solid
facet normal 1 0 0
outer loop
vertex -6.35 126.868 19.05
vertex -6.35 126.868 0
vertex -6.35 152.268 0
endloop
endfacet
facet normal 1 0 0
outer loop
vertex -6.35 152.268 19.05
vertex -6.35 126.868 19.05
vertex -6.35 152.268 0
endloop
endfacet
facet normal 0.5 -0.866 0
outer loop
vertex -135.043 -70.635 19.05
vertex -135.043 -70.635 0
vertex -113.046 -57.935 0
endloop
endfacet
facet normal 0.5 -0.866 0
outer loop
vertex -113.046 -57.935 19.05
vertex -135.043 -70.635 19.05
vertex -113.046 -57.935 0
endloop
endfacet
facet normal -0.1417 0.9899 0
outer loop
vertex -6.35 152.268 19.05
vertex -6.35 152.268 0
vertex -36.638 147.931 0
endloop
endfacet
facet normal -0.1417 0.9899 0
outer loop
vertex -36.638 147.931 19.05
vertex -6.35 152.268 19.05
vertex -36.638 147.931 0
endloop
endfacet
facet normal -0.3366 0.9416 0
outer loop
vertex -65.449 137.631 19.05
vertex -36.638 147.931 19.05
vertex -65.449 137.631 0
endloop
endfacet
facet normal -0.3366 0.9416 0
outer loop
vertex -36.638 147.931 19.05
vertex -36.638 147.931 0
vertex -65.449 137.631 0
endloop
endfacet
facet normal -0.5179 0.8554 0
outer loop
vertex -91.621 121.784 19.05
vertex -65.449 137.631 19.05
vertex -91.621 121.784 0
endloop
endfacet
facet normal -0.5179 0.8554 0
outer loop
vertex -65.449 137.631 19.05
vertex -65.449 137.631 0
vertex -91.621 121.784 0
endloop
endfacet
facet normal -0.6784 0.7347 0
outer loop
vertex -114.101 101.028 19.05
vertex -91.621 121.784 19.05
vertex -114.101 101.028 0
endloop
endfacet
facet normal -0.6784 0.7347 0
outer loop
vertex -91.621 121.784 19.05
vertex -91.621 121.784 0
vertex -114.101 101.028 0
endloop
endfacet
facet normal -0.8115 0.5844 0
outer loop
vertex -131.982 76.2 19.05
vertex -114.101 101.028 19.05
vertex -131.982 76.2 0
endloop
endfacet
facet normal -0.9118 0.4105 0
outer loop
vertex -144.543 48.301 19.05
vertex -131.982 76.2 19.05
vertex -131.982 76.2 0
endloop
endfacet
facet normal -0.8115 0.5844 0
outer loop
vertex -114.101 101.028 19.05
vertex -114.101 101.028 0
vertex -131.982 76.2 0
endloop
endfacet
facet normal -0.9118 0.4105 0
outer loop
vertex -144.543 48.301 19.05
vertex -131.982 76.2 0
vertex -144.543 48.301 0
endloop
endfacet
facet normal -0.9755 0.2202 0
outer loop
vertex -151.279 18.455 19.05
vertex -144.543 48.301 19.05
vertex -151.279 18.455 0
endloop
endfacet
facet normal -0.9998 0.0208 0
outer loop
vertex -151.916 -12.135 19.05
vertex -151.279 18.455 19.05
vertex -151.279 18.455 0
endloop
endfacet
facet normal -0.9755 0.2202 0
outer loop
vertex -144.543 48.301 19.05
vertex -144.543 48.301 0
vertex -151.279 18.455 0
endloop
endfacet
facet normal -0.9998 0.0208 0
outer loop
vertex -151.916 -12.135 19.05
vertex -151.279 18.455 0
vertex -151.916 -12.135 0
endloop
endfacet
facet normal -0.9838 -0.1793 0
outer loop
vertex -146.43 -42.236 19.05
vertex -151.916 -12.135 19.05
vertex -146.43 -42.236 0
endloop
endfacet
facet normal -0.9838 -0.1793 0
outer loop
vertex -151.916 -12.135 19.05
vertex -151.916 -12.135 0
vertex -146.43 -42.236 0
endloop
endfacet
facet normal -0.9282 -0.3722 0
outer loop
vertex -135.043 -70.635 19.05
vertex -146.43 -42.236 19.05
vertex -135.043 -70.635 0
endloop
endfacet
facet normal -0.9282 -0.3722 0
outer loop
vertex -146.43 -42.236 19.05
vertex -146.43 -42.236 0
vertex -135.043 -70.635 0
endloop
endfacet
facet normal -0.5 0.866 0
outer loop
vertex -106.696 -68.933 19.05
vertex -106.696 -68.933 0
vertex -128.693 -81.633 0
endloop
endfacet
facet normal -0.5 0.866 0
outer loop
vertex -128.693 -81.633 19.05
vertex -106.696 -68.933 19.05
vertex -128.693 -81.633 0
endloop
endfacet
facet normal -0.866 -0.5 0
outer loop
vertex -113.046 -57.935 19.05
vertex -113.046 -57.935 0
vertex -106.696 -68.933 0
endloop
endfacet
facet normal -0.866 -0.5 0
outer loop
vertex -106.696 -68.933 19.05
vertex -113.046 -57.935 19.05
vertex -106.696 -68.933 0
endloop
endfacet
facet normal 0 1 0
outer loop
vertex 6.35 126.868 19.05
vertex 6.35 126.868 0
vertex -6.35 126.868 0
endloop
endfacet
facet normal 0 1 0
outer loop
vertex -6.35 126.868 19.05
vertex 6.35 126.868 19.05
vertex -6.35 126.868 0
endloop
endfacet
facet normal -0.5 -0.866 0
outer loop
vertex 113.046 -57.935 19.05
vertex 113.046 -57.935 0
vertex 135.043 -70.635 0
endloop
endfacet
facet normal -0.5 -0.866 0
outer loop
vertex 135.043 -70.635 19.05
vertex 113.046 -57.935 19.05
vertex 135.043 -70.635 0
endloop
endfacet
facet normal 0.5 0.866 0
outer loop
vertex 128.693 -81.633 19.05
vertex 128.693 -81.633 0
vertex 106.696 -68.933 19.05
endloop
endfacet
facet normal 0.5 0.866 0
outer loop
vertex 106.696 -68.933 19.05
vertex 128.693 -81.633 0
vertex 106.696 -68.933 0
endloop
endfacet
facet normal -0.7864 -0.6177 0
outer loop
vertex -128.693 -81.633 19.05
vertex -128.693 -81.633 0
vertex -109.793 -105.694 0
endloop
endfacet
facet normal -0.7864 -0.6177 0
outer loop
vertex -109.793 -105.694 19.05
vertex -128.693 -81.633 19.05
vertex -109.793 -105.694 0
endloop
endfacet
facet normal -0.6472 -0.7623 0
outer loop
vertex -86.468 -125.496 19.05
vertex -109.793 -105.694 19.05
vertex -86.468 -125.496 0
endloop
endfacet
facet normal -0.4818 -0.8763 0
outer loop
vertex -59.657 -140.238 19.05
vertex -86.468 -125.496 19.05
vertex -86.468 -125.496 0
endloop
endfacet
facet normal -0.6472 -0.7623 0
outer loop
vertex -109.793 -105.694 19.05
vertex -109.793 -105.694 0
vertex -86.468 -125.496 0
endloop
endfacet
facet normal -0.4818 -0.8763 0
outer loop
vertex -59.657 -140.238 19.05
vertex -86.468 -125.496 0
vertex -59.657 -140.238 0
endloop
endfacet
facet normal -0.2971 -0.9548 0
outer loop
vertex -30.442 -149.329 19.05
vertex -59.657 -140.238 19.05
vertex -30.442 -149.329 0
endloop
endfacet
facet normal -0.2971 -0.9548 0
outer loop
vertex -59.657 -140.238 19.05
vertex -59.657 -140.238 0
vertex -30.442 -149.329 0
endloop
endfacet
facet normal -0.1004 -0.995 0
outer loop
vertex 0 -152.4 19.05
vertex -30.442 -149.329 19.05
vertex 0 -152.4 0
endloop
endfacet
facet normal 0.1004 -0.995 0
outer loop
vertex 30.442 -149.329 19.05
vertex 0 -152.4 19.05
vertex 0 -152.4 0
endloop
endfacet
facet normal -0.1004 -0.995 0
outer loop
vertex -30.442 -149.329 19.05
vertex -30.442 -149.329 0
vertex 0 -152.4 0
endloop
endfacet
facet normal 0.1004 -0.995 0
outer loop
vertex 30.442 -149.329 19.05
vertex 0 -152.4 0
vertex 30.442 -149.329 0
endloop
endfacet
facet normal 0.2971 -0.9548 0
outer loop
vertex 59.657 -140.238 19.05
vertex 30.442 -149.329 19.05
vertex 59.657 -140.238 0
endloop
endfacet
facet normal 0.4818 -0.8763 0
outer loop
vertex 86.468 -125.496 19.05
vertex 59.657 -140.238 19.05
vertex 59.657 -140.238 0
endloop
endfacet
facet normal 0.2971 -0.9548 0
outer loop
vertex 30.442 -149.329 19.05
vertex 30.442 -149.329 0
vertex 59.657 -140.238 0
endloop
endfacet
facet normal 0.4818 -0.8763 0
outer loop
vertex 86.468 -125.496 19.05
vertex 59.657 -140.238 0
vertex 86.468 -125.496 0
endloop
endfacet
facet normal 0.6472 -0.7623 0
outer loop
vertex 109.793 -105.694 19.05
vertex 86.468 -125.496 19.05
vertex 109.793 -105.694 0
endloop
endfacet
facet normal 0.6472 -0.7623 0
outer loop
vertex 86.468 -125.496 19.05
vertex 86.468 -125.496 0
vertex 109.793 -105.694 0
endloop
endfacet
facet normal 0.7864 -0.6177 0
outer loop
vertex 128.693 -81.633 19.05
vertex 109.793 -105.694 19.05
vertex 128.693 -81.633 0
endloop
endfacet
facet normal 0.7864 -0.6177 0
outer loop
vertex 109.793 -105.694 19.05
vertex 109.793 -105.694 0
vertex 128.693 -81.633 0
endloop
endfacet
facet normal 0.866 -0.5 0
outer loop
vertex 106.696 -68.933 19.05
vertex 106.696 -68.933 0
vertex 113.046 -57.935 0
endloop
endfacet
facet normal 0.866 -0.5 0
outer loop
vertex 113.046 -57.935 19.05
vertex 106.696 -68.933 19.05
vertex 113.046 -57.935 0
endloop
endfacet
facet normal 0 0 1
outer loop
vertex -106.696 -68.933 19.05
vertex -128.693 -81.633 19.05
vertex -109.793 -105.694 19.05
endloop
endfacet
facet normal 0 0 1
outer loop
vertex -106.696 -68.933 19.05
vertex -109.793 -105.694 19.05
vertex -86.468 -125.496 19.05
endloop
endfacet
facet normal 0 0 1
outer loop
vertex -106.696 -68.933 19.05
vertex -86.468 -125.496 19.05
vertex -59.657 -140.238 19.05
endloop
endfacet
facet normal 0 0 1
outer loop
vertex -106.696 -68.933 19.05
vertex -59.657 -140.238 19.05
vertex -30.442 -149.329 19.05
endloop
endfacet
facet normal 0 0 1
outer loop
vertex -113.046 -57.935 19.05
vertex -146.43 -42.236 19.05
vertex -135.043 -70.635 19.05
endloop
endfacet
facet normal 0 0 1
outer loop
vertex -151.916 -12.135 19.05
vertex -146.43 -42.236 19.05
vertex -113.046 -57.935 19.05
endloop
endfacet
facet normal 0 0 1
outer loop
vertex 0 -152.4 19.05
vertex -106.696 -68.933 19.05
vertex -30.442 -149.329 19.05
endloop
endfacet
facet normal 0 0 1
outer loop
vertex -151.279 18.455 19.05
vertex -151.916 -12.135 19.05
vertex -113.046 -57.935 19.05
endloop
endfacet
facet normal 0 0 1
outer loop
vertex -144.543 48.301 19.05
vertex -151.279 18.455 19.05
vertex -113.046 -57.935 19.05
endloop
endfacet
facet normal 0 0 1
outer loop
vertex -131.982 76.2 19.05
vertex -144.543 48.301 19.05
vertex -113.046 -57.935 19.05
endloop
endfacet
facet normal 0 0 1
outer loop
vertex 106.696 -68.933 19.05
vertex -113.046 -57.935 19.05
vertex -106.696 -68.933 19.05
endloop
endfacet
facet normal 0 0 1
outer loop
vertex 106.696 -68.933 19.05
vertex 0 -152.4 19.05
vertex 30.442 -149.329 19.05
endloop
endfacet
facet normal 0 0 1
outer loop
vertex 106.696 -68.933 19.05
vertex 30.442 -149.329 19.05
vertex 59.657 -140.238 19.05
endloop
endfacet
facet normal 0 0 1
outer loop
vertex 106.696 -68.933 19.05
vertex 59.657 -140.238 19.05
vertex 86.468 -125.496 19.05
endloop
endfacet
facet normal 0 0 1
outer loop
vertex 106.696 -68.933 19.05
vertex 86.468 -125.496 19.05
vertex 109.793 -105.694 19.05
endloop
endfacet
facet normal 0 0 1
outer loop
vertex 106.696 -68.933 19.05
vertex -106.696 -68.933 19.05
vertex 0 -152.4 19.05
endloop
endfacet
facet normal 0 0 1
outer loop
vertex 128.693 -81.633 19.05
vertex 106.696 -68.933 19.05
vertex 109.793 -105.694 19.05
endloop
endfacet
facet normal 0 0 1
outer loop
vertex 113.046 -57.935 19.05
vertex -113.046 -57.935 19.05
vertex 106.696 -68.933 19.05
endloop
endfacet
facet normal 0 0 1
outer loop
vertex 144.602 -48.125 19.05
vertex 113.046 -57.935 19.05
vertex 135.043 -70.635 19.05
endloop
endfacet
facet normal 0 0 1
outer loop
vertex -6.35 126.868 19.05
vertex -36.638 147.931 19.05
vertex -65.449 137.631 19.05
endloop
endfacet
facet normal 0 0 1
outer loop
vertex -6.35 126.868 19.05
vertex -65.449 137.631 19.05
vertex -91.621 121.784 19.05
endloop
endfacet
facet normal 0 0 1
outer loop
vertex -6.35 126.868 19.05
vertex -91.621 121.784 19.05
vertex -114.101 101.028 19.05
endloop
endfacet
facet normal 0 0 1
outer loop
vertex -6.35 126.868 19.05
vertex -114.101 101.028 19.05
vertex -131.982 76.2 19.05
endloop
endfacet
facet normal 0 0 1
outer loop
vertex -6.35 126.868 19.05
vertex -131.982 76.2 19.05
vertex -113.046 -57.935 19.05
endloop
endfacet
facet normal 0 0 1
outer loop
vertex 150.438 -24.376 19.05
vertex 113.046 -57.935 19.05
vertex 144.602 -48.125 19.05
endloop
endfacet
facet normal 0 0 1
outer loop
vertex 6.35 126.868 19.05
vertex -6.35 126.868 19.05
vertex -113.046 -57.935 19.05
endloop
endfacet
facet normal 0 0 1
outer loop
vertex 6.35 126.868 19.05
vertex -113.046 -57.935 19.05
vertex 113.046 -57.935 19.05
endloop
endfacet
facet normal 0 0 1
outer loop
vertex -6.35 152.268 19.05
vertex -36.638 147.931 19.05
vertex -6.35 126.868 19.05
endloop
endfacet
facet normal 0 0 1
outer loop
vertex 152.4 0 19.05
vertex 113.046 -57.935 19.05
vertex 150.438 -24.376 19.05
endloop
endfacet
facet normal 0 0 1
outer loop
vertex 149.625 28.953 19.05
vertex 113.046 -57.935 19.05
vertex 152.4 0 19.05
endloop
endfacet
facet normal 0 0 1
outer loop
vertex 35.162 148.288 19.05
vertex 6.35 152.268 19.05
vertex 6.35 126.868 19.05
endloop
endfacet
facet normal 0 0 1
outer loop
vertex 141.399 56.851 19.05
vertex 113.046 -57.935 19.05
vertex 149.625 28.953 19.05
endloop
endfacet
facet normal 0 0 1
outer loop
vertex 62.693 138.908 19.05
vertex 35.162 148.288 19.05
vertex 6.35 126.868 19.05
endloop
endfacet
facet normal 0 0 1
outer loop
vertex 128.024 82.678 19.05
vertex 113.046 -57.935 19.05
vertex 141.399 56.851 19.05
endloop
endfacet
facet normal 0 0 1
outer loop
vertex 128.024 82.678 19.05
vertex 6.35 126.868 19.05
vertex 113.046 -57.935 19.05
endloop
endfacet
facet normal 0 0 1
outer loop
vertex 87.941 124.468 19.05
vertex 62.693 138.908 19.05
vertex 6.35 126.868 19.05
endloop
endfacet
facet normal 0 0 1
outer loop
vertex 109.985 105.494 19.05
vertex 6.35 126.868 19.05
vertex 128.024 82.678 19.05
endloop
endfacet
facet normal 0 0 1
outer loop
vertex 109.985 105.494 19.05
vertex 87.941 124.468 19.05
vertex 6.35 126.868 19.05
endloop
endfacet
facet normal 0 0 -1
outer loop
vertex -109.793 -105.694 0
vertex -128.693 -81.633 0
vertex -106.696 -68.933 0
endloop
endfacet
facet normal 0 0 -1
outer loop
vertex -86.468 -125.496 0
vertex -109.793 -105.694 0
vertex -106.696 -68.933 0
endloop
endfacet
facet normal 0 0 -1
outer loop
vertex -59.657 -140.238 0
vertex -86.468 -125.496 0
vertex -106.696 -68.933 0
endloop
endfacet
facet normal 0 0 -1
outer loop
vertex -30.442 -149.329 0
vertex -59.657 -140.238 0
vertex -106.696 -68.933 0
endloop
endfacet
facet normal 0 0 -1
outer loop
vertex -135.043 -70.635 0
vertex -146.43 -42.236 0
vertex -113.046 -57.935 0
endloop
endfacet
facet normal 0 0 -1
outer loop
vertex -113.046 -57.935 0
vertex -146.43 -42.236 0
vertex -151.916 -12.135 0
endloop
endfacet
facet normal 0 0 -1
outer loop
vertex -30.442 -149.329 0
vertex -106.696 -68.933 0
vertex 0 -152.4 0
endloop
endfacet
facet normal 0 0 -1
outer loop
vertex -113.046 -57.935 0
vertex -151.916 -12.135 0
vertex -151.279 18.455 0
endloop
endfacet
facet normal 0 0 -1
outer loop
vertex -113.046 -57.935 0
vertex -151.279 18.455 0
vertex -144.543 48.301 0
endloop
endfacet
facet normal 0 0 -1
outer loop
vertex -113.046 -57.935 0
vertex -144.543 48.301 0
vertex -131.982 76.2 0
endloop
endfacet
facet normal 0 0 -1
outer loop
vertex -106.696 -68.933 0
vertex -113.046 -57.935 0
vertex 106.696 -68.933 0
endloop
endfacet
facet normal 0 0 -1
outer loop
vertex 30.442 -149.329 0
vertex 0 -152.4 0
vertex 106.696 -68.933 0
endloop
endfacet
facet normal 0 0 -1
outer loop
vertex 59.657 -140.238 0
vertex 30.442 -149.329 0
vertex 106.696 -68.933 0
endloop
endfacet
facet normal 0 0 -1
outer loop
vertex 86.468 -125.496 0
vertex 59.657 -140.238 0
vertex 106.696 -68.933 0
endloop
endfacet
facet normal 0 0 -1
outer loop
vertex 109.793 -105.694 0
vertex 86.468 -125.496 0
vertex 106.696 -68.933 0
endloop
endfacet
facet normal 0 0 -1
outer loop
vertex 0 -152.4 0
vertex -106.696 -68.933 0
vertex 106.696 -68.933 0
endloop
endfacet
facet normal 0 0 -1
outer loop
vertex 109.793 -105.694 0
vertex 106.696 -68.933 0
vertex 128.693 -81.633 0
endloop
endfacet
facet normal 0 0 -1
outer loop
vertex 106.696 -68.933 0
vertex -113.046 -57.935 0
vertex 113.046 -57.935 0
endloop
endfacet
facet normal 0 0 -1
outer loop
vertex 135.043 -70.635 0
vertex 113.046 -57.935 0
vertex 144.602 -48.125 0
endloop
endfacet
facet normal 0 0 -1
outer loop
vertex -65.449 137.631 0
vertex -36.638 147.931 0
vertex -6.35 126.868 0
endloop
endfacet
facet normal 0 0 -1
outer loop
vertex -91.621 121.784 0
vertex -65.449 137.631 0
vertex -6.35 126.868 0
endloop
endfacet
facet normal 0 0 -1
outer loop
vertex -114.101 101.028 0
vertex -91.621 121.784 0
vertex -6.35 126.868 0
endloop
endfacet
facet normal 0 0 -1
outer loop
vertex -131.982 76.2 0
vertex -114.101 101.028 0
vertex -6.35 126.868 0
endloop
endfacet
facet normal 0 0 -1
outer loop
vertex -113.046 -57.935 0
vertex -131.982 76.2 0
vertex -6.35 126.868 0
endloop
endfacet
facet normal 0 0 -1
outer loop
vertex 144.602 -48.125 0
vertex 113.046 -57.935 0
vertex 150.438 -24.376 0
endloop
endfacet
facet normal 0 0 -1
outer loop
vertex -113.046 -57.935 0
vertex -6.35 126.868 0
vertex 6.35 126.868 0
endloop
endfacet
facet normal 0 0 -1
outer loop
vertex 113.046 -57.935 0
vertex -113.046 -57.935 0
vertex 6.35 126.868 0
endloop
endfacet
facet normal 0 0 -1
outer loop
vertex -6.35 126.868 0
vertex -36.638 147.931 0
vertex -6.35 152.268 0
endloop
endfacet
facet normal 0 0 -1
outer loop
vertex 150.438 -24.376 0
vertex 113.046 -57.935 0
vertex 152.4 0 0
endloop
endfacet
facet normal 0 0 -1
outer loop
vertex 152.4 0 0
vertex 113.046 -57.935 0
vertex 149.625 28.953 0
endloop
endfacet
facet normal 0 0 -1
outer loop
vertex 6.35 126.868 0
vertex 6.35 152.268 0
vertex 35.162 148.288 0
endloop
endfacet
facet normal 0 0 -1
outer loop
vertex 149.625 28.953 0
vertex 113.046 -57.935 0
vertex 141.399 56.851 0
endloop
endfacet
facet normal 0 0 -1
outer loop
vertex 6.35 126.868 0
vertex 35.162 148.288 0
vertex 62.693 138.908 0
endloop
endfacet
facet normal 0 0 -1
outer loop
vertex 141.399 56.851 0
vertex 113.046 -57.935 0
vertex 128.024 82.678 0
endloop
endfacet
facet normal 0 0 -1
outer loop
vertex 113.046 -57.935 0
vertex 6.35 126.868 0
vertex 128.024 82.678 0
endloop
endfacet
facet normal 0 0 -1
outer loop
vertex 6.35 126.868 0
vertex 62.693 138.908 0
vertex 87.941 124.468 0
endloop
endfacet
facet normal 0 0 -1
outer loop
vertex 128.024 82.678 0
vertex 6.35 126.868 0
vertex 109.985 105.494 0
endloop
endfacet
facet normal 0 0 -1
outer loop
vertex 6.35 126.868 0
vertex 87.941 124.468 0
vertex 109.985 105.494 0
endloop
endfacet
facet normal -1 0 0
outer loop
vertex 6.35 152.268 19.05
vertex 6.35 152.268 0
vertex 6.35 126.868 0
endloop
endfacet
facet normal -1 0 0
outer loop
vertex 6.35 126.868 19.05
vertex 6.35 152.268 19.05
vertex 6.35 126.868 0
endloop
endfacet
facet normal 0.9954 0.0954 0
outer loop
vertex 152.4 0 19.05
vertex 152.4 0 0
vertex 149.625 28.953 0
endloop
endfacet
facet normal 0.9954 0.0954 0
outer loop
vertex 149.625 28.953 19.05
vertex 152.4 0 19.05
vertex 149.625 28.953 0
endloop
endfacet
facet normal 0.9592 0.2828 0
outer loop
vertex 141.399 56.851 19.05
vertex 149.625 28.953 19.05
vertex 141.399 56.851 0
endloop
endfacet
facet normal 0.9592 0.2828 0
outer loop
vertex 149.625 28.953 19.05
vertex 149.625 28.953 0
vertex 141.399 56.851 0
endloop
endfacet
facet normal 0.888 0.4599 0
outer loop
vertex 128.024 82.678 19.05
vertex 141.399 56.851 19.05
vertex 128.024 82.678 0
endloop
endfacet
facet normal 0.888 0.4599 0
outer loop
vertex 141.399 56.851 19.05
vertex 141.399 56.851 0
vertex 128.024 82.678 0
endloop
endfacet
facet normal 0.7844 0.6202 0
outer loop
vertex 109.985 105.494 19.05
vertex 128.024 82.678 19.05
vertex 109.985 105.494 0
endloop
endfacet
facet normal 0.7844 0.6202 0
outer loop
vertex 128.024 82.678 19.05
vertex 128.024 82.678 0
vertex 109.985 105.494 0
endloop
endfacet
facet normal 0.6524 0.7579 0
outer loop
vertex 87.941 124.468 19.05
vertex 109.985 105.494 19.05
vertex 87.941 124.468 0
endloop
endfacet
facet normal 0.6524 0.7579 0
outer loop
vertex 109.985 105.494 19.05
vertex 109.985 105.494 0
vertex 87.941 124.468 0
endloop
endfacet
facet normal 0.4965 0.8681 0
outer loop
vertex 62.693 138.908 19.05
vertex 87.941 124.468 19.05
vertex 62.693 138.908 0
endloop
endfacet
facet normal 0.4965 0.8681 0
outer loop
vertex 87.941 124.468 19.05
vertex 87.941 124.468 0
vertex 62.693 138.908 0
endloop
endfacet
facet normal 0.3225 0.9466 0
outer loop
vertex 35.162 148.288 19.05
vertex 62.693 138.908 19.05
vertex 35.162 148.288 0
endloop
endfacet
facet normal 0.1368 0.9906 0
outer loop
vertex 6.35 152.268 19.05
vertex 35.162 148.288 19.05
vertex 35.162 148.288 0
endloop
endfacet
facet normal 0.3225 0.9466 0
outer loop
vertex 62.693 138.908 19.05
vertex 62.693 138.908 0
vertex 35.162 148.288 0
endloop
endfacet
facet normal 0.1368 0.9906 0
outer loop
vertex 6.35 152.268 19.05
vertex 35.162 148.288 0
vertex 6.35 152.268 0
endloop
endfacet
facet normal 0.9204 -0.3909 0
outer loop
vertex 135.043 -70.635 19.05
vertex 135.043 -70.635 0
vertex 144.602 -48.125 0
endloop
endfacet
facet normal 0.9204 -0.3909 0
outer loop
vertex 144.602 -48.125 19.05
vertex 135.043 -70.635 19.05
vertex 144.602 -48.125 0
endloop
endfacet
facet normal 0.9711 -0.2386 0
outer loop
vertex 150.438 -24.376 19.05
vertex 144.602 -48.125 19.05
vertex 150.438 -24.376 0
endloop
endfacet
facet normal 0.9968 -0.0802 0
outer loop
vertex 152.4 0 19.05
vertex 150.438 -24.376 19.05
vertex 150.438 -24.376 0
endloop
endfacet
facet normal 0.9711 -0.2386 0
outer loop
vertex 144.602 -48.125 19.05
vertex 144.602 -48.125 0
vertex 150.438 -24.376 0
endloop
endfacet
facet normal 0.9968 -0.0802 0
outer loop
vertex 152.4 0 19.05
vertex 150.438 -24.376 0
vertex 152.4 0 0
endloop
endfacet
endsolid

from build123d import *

# Parameters (mm, degrees)
F1_DEPTH = 19.05


with BuildPart() as f1:
    # F0 (on Top) → F1 (new body)
    with BuildSketch(Plane.XY):
        with BuildLine():
            ThreePointArc((135.042654, -70.634564), (147.997062, -36.367977), (152.4, 0))
            ThreePointArc((152.4, 0), (109.985226, 105.494123), (6.35, 152.267651))
            Line((6.35, 152.267651), (6.35, 126.867651))
            Line((6.35, 126.867651), (-6.35, 126.867651))
            Line((-6.35, 126.867651), (-6.35, 152.267651))
            ThreePointArc((-6.35, 152.267651), (-131.982272, 76.2), (-135.042654, -70.634564))
            Line((-135.042654, -70.634564), (-113.045609, -57.934564))
            Line((-113.045609, -57.934564), (-106.695609, -68.933087))
            Line((-106.695609, -68.933087), (-128.692654, -81.633087))
            ThreePointArc((-128.692654, -81.633087), (0, -152.4), (128.692654, -81.633087))
            Line((128.692654, -81.633087), (106.695609, -68.933087))
            Line((106.695609, -68.933087), (113.045609, -57.934564))
            Line((113.045609, -57.934564), (135.042654, -70.634564))
        make_face()
    extrude(amount=F1_DEPTH)


solid = f1.part
